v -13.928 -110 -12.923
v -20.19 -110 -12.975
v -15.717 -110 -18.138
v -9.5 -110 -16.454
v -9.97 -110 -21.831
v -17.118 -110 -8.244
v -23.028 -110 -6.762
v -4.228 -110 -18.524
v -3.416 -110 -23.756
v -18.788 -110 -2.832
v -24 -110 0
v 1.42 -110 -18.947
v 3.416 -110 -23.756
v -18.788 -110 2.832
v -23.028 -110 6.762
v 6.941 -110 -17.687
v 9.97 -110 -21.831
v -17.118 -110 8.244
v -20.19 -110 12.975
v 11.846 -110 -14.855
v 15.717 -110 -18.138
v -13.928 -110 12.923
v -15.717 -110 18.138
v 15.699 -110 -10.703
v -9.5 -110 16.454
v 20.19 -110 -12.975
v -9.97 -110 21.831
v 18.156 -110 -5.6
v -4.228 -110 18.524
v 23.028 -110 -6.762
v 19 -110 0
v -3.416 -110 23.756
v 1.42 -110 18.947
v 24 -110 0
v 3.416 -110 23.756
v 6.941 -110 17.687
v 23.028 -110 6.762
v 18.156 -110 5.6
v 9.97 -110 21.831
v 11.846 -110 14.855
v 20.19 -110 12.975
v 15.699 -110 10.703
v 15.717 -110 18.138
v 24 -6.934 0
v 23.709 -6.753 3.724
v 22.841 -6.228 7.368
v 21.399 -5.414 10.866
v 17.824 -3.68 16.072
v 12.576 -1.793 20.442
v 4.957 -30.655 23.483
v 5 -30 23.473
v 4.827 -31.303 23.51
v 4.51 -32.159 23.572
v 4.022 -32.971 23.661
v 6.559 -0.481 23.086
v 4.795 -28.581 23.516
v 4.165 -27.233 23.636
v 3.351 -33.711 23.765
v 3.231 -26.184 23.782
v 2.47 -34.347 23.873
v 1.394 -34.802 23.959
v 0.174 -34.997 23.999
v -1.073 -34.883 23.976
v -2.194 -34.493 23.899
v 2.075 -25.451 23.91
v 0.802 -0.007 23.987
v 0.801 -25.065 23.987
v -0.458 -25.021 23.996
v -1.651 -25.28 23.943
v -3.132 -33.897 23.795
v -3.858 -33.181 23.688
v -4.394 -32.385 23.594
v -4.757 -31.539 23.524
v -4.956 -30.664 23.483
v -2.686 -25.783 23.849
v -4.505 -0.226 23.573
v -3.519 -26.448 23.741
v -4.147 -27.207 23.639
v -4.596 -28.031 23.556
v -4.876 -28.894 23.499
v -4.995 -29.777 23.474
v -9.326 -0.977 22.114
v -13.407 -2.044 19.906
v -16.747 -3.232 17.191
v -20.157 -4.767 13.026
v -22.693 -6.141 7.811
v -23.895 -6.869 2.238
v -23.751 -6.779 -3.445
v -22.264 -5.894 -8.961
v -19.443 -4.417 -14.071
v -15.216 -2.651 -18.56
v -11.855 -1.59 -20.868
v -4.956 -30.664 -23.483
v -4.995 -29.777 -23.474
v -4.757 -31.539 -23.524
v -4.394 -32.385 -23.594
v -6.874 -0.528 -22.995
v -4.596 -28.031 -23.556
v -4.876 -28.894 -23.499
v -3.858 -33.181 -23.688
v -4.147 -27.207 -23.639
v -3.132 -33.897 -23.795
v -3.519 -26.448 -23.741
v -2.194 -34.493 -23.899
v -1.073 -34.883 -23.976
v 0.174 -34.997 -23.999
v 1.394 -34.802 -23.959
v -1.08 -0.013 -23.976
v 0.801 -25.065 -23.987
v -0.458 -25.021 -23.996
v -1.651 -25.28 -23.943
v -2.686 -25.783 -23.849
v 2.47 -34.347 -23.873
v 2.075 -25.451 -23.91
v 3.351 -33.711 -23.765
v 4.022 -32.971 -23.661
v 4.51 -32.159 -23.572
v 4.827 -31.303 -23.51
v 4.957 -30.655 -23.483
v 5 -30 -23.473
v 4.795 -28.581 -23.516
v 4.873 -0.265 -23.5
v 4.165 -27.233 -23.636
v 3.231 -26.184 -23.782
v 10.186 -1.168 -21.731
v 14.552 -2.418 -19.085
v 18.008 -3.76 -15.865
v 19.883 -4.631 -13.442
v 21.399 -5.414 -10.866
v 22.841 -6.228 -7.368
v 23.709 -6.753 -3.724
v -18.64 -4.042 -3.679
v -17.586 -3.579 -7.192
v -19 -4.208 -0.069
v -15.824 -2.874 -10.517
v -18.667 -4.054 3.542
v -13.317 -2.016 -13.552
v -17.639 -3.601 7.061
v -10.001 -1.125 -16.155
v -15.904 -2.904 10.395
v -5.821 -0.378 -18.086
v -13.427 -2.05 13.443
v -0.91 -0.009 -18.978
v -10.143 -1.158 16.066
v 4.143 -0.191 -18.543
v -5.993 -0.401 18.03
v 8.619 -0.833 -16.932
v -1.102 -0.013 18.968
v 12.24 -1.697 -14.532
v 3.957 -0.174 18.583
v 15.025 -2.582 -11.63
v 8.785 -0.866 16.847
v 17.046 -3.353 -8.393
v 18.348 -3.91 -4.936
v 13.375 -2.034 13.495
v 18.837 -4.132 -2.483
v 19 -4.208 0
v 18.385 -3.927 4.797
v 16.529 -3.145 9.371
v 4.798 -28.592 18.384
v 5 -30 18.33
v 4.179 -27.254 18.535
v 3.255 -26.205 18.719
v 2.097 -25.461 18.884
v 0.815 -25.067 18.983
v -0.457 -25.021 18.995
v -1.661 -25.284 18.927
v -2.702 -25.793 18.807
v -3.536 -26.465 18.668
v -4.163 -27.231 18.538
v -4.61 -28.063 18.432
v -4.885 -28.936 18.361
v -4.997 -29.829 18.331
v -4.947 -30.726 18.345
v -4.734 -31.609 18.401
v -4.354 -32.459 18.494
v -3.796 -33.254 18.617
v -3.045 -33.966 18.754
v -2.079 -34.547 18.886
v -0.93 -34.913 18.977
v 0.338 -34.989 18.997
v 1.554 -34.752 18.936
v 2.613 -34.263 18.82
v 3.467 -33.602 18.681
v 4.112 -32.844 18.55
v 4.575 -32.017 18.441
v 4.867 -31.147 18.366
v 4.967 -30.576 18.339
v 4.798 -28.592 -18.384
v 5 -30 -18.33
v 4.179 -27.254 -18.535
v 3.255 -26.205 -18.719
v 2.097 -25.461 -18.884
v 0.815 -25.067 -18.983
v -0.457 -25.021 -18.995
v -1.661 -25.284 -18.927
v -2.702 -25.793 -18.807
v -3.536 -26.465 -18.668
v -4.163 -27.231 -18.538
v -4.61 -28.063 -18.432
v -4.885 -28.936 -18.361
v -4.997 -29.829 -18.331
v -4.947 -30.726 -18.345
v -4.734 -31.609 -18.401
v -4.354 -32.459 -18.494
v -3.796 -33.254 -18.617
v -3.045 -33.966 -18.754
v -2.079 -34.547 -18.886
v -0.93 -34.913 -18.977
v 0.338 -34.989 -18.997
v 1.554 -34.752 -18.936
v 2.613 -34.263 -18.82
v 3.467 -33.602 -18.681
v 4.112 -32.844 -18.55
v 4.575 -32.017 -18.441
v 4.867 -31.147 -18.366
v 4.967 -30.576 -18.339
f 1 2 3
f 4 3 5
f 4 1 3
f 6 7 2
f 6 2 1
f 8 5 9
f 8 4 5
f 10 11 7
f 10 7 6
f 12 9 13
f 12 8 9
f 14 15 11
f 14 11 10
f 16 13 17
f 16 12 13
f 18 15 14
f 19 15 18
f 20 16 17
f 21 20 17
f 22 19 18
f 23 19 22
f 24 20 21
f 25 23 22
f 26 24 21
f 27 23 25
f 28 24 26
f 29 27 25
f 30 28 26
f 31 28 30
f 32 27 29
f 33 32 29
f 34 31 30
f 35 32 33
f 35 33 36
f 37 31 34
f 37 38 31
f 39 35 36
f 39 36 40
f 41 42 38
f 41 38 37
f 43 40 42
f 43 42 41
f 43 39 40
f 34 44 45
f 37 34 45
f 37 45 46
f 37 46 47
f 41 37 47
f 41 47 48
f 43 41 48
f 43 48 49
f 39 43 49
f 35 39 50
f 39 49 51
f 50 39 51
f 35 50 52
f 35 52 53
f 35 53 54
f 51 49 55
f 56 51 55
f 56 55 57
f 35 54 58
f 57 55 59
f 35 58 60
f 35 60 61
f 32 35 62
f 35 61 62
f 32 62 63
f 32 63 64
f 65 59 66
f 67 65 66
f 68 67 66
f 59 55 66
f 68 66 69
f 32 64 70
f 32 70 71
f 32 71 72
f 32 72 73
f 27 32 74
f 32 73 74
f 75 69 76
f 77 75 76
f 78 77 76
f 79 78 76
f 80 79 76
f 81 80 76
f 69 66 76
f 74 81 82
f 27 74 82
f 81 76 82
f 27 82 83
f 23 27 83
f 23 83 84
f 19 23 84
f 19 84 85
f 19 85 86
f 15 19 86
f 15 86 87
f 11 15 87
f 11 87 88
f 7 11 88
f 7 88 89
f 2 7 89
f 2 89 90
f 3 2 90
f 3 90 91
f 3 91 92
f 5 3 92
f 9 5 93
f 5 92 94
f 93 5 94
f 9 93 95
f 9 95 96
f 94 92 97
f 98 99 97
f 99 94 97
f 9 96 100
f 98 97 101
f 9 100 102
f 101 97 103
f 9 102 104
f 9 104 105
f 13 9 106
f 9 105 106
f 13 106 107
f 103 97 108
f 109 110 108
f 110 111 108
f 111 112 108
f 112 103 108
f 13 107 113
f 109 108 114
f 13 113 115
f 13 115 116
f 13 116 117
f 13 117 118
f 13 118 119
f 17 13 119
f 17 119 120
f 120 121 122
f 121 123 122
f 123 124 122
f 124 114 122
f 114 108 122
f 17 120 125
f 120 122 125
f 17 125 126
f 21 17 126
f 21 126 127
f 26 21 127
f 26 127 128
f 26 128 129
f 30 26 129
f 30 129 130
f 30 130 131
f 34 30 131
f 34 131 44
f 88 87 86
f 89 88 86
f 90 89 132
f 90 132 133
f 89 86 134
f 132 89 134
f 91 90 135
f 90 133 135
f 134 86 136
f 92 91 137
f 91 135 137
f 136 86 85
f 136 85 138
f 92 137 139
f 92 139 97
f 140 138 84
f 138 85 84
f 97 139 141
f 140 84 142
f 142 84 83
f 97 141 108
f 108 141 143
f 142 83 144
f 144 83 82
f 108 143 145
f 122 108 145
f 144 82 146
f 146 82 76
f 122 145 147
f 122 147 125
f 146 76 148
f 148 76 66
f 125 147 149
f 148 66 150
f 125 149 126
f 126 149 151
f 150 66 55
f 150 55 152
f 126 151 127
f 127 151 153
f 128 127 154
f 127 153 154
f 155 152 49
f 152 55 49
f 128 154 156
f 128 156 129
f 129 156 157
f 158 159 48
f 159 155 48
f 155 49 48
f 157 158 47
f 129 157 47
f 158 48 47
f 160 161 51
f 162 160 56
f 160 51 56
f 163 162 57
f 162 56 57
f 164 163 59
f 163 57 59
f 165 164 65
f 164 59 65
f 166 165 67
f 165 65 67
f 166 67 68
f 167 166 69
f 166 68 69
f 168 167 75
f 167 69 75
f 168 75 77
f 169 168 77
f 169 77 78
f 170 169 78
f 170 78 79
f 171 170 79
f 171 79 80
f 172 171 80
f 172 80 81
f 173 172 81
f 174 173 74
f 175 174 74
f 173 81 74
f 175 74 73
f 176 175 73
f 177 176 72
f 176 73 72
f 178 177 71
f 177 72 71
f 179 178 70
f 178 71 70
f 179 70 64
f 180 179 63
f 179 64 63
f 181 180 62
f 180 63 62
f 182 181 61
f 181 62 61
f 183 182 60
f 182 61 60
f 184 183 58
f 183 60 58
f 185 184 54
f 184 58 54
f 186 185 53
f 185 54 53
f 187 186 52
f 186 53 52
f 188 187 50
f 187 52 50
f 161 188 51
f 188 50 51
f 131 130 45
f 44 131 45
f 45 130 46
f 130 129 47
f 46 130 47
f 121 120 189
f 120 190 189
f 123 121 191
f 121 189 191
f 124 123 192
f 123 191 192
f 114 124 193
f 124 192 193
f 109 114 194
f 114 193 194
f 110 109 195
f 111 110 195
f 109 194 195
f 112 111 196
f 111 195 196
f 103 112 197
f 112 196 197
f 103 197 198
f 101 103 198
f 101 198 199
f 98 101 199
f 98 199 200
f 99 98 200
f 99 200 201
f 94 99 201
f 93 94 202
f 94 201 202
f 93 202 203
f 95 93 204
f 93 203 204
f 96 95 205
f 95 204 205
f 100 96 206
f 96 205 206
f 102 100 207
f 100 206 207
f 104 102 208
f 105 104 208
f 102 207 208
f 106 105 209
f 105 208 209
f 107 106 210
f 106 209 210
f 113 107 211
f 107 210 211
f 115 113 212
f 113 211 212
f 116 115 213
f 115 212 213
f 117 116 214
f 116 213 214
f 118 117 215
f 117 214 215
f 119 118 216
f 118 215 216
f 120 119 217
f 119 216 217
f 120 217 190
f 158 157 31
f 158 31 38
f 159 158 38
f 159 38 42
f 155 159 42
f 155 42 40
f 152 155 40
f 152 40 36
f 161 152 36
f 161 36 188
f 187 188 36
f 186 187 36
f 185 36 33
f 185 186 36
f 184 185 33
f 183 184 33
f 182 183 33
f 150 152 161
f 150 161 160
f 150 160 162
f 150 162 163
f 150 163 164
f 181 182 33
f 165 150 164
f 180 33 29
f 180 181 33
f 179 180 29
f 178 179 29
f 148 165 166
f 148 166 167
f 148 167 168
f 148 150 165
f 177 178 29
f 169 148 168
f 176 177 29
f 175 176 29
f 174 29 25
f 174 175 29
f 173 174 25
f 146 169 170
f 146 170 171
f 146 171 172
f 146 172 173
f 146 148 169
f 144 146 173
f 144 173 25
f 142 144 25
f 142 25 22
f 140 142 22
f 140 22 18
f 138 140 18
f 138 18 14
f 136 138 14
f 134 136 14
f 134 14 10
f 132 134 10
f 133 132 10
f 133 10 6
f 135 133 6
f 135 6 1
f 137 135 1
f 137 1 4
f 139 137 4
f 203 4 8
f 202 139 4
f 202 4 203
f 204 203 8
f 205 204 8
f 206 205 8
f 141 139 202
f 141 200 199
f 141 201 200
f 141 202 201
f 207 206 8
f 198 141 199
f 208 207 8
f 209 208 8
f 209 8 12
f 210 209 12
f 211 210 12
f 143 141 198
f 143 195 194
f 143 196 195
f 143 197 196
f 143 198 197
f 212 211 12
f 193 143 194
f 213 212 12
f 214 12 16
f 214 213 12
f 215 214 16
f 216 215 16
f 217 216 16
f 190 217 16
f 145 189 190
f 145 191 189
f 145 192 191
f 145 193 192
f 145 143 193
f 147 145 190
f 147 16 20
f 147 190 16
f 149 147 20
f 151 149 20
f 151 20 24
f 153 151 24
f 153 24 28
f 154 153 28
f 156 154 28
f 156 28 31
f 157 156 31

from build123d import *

# Parameters (mm, degrees)
F0_R     = 24
F0_R_2   = 19
F1_DEPTH = 110
F4_R     = 5
F5_DEPTH = 48.4
F6_DEPTH = 47.8


with BuildPart() as f1:
    # F0 (on Front) → F1 (new body)
    with BuildSketch(Plane.XZ):
        Circle(F0_R)
        Circle(F0_R_2, mode=Mode.SUBTRACT)
    extrude(amount=F1_DEPTH)

    # F4 (on offset) → F5 (cut, symmetric)
    with BuildSketch(Plane.XY.offset(-20)):
        with Locations((0, -30)):
            Circle(F4_R)
    extrude(amount=F5_DEPTH, both=True, mode=Mode.SUBTRACT)

    # F4 (on offset) → F6 (cut, symmetric)
    with BuildSketch(Plane.XY.offset(-20)):
        with BuildLine():
            ThreePointArc((0, 0), (11.0367302172, -1.3744273836), (21.3992744684, -5.4137517283))
            ThreePointArc((21.3992744684, -5.4137517283), (23.0936332862, -6.3776735341), (24.744655937, -7.414071748))
            Line((24.744655937, -7.414071748), (24.744655937, 8.4094852209))
            Line((24.744655937, 8.4094852209), (-25.4213437438, 8.4094852209))
            Line((-25.4213437438, 8.4094852209), (-25.4213437438, -7.8684058751))
            ThreePointArc((-25.4213437438, -7.8684058751), (-13.3056052921, -2.0120846305), (0, 0))
        make_face()
    extrude(amount=F6_DEPTH, both=True, mode=Mode.SUBTRACT)


solid = f1.part
